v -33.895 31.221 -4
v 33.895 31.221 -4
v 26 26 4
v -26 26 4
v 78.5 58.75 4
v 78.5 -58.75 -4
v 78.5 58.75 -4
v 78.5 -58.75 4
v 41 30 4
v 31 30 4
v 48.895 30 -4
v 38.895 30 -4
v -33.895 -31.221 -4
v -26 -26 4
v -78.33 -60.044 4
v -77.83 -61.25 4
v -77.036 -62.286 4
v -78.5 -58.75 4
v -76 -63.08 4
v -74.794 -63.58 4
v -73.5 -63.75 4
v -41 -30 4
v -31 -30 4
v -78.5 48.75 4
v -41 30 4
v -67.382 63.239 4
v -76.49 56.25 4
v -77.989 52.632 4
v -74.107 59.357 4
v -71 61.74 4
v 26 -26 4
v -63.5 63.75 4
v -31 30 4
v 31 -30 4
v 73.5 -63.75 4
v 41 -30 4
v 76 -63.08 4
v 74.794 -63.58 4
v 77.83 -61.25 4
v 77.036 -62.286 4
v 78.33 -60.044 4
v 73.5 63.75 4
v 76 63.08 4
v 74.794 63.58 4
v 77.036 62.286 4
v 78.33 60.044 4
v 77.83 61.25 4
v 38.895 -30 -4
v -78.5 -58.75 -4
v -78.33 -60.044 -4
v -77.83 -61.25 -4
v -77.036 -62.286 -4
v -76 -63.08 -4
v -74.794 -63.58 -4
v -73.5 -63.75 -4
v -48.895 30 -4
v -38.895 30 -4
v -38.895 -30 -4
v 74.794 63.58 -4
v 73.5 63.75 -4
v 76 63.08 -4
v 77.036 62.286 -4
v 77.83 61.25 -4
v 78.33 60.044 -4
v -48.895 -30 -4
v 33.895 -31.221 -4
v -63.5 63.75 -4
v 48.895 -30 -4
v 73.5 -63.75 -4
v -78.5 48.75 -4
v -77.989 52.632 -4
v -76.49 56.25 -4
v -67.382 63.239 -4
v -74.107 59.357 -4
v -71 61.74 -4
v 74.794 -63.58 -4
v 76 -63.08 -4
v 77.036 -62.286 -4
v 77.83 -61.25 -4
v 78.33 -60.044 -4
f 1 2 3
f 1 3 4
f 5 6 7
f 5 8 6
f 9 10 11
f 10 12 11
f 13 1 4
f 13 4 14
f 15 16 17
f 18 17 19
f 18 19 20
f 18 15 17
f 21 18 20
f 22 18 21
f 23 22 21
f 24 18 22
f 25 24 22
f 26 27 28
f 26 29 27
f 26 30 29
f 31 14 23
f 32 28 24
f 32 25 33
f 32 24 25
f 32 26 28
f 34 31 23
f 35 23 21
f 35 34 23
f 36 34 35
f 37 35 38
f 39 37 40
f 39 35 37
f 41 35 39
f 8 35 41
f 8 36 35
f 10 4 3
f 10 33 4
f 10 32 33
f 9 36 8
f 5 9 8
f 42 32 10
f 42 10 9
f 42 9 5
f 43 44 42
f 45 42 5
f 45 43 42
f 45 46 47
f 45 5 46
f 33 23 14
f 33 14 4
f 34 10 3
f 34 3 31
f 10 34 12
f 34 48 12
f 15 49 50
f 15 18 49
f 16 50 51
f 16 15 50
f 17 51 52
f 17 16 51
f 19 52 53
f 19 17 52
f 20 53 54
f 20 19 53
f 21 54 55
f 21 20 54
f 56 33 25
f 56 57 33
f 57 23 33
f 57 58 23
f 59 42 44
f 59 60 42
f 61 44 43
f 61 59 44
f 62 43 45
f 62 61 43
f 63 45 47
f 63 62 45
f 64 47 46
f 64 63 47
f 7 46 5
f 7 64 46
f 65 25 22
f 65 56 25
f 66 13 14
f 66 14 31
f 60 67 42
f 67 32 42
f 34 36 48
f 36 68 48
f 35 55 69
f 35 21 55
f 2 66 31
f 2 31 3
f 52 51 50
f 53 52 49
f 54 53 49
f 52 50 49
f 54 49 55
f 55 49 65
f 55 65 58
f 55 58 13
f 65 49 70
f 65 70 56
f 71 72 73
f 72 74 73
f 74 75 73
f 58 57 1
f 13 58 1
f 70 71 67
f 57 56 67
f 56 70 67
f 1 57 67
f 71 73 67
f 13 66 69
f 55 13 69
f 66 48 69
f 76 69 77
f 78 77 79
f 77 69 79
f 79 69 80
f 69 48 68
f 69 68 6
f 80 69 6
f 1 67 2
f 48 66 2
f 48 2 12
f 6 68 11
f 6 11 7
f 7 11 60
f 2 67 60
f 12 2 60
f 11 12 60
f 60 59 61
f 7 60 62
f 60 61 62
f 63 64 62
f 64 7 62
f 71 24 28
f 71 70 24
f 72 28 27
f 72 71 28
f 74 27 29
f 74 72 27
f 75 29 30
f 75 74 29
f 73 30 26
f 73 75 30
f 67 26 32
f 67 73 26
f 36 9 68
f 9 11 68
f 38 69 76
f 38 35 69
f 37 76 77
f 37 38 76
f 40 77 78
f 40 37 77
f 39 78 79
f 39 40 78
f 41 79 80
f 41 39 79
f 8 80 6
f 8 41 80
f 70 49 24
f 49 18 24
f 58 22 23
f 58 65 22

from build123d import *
from OCP.BRepFilletAPI import BRepFilletAPI_MakeFillet

# Parameters (mm, degrees)
SKETCH1_W           = 157
SKETCH1_H           = 127.5
BOSS_EXTRUDE1_DEPTH = 4
FILLET1_R1          = 15
FILLET1_R2          = 5


with BuildPart() as part:
    # Sketch1 → Boss-Extrude1 (new, symmetric)
    with BuildSketch(Plane.XY):
        Rectangle(SKETCH1_W, SKETCH1_H)
    extrude(amount=BOSS_EXTRUDE1_DEPTH, both=True)

    # Sketch2 → Cut-Loft1 section 0
    with BuildSketch(Plane.XY.offset(4)):
        with BuildLine():
            Line((-26, -26), (26, -26))
            Line((26, -26), (26, 26))
            Line((26, 26), (-26, 26))
            Line((-26, 26), (-26, -26))
        make_face()
    # Sketch4 → Cut-Loft1 section 1
    with BuildSketch(Plane.XY.offset(-34)):
        with BuildLine():
            Line((63.5, -50.8), (-63.5, -50.8))
            Line((-63.5, -50.8), (-63.5, 50.8))
            Line((-63.5, 50.8), (63.5, 50.8))
            Line((63.5, 50.8), (63.5, -50.8))
        make_face()
    loft(mode=Mode.SUBTRACT)

    # Sketch5 → Cut-Loft2 section 0
    with BuildSketch(Plane.XY.offset(4)):
        with BuildLine():
            Line((-31, 30), (-41, 30))
            Line((-41, 30), (-41, -30))
            Line((-41, -30), (-31, -30))
            Line((-31, -30), (-31, 30))
        make_face()
    # Sketch6 → Cut-Loft2 section 1
    with BuildSketch(Plane(origin=(0, 0, -4), x_dir=(-1, 0, 0), z_dir=(0, 0, -1))):
        with BuildLine():
            Line((38.894736842, 30), (48.894736842, 30))
            Line((48.894736842, 30), (48.894736842, -30))
            Line((48.894736842, -30), (38.894736842, -30))
            Line((38.894736842, -30), (38.894736842, 30))
        make_face()
    cut_loft2 = loft(mode=Mode.SUBTRACT)

    # Mirror1: Cut-Loft2 across plane
    add(cut_loft2.mirror(Plane(origin=(0, 0, 0), x_dir=(0, 0, 1), z_dir=(1, 0, 0))), mode=Mode.SUBTRACT)

    # Fillet1: one fillet with a radius per group of edges: ONE call of the kernel's fillet builder (fillet() takes one radius for all edges)
    fillet1_edges_1 = [part.edges().sort_by_distance(p)[0] for p in [
        (-78.5, 63.75, 0),
    ]]
    fillet1_edges_2 = [part.edges().sort_by_distance(p)[0] for p in [
        (78.5, 63.75, 0),
        (78.5, -63.75, 0),
        (-78.5, -63.75, 0),
    ]]
    fillet1 = BRepFilletAPI_MakeFillet(part.part.solid().wrapped)
    for e in fillet1_edges_1:
        fillet1.Add(FILLET1_R1, e.wrapped)
    for e in fillet1_edges_2:
        fillet1.Add(FILLET1_R2, e.wrapped)
    add(Compound.cast(fillet1.Shape()), mode=Mode.REPLACE)


solid = part.part
